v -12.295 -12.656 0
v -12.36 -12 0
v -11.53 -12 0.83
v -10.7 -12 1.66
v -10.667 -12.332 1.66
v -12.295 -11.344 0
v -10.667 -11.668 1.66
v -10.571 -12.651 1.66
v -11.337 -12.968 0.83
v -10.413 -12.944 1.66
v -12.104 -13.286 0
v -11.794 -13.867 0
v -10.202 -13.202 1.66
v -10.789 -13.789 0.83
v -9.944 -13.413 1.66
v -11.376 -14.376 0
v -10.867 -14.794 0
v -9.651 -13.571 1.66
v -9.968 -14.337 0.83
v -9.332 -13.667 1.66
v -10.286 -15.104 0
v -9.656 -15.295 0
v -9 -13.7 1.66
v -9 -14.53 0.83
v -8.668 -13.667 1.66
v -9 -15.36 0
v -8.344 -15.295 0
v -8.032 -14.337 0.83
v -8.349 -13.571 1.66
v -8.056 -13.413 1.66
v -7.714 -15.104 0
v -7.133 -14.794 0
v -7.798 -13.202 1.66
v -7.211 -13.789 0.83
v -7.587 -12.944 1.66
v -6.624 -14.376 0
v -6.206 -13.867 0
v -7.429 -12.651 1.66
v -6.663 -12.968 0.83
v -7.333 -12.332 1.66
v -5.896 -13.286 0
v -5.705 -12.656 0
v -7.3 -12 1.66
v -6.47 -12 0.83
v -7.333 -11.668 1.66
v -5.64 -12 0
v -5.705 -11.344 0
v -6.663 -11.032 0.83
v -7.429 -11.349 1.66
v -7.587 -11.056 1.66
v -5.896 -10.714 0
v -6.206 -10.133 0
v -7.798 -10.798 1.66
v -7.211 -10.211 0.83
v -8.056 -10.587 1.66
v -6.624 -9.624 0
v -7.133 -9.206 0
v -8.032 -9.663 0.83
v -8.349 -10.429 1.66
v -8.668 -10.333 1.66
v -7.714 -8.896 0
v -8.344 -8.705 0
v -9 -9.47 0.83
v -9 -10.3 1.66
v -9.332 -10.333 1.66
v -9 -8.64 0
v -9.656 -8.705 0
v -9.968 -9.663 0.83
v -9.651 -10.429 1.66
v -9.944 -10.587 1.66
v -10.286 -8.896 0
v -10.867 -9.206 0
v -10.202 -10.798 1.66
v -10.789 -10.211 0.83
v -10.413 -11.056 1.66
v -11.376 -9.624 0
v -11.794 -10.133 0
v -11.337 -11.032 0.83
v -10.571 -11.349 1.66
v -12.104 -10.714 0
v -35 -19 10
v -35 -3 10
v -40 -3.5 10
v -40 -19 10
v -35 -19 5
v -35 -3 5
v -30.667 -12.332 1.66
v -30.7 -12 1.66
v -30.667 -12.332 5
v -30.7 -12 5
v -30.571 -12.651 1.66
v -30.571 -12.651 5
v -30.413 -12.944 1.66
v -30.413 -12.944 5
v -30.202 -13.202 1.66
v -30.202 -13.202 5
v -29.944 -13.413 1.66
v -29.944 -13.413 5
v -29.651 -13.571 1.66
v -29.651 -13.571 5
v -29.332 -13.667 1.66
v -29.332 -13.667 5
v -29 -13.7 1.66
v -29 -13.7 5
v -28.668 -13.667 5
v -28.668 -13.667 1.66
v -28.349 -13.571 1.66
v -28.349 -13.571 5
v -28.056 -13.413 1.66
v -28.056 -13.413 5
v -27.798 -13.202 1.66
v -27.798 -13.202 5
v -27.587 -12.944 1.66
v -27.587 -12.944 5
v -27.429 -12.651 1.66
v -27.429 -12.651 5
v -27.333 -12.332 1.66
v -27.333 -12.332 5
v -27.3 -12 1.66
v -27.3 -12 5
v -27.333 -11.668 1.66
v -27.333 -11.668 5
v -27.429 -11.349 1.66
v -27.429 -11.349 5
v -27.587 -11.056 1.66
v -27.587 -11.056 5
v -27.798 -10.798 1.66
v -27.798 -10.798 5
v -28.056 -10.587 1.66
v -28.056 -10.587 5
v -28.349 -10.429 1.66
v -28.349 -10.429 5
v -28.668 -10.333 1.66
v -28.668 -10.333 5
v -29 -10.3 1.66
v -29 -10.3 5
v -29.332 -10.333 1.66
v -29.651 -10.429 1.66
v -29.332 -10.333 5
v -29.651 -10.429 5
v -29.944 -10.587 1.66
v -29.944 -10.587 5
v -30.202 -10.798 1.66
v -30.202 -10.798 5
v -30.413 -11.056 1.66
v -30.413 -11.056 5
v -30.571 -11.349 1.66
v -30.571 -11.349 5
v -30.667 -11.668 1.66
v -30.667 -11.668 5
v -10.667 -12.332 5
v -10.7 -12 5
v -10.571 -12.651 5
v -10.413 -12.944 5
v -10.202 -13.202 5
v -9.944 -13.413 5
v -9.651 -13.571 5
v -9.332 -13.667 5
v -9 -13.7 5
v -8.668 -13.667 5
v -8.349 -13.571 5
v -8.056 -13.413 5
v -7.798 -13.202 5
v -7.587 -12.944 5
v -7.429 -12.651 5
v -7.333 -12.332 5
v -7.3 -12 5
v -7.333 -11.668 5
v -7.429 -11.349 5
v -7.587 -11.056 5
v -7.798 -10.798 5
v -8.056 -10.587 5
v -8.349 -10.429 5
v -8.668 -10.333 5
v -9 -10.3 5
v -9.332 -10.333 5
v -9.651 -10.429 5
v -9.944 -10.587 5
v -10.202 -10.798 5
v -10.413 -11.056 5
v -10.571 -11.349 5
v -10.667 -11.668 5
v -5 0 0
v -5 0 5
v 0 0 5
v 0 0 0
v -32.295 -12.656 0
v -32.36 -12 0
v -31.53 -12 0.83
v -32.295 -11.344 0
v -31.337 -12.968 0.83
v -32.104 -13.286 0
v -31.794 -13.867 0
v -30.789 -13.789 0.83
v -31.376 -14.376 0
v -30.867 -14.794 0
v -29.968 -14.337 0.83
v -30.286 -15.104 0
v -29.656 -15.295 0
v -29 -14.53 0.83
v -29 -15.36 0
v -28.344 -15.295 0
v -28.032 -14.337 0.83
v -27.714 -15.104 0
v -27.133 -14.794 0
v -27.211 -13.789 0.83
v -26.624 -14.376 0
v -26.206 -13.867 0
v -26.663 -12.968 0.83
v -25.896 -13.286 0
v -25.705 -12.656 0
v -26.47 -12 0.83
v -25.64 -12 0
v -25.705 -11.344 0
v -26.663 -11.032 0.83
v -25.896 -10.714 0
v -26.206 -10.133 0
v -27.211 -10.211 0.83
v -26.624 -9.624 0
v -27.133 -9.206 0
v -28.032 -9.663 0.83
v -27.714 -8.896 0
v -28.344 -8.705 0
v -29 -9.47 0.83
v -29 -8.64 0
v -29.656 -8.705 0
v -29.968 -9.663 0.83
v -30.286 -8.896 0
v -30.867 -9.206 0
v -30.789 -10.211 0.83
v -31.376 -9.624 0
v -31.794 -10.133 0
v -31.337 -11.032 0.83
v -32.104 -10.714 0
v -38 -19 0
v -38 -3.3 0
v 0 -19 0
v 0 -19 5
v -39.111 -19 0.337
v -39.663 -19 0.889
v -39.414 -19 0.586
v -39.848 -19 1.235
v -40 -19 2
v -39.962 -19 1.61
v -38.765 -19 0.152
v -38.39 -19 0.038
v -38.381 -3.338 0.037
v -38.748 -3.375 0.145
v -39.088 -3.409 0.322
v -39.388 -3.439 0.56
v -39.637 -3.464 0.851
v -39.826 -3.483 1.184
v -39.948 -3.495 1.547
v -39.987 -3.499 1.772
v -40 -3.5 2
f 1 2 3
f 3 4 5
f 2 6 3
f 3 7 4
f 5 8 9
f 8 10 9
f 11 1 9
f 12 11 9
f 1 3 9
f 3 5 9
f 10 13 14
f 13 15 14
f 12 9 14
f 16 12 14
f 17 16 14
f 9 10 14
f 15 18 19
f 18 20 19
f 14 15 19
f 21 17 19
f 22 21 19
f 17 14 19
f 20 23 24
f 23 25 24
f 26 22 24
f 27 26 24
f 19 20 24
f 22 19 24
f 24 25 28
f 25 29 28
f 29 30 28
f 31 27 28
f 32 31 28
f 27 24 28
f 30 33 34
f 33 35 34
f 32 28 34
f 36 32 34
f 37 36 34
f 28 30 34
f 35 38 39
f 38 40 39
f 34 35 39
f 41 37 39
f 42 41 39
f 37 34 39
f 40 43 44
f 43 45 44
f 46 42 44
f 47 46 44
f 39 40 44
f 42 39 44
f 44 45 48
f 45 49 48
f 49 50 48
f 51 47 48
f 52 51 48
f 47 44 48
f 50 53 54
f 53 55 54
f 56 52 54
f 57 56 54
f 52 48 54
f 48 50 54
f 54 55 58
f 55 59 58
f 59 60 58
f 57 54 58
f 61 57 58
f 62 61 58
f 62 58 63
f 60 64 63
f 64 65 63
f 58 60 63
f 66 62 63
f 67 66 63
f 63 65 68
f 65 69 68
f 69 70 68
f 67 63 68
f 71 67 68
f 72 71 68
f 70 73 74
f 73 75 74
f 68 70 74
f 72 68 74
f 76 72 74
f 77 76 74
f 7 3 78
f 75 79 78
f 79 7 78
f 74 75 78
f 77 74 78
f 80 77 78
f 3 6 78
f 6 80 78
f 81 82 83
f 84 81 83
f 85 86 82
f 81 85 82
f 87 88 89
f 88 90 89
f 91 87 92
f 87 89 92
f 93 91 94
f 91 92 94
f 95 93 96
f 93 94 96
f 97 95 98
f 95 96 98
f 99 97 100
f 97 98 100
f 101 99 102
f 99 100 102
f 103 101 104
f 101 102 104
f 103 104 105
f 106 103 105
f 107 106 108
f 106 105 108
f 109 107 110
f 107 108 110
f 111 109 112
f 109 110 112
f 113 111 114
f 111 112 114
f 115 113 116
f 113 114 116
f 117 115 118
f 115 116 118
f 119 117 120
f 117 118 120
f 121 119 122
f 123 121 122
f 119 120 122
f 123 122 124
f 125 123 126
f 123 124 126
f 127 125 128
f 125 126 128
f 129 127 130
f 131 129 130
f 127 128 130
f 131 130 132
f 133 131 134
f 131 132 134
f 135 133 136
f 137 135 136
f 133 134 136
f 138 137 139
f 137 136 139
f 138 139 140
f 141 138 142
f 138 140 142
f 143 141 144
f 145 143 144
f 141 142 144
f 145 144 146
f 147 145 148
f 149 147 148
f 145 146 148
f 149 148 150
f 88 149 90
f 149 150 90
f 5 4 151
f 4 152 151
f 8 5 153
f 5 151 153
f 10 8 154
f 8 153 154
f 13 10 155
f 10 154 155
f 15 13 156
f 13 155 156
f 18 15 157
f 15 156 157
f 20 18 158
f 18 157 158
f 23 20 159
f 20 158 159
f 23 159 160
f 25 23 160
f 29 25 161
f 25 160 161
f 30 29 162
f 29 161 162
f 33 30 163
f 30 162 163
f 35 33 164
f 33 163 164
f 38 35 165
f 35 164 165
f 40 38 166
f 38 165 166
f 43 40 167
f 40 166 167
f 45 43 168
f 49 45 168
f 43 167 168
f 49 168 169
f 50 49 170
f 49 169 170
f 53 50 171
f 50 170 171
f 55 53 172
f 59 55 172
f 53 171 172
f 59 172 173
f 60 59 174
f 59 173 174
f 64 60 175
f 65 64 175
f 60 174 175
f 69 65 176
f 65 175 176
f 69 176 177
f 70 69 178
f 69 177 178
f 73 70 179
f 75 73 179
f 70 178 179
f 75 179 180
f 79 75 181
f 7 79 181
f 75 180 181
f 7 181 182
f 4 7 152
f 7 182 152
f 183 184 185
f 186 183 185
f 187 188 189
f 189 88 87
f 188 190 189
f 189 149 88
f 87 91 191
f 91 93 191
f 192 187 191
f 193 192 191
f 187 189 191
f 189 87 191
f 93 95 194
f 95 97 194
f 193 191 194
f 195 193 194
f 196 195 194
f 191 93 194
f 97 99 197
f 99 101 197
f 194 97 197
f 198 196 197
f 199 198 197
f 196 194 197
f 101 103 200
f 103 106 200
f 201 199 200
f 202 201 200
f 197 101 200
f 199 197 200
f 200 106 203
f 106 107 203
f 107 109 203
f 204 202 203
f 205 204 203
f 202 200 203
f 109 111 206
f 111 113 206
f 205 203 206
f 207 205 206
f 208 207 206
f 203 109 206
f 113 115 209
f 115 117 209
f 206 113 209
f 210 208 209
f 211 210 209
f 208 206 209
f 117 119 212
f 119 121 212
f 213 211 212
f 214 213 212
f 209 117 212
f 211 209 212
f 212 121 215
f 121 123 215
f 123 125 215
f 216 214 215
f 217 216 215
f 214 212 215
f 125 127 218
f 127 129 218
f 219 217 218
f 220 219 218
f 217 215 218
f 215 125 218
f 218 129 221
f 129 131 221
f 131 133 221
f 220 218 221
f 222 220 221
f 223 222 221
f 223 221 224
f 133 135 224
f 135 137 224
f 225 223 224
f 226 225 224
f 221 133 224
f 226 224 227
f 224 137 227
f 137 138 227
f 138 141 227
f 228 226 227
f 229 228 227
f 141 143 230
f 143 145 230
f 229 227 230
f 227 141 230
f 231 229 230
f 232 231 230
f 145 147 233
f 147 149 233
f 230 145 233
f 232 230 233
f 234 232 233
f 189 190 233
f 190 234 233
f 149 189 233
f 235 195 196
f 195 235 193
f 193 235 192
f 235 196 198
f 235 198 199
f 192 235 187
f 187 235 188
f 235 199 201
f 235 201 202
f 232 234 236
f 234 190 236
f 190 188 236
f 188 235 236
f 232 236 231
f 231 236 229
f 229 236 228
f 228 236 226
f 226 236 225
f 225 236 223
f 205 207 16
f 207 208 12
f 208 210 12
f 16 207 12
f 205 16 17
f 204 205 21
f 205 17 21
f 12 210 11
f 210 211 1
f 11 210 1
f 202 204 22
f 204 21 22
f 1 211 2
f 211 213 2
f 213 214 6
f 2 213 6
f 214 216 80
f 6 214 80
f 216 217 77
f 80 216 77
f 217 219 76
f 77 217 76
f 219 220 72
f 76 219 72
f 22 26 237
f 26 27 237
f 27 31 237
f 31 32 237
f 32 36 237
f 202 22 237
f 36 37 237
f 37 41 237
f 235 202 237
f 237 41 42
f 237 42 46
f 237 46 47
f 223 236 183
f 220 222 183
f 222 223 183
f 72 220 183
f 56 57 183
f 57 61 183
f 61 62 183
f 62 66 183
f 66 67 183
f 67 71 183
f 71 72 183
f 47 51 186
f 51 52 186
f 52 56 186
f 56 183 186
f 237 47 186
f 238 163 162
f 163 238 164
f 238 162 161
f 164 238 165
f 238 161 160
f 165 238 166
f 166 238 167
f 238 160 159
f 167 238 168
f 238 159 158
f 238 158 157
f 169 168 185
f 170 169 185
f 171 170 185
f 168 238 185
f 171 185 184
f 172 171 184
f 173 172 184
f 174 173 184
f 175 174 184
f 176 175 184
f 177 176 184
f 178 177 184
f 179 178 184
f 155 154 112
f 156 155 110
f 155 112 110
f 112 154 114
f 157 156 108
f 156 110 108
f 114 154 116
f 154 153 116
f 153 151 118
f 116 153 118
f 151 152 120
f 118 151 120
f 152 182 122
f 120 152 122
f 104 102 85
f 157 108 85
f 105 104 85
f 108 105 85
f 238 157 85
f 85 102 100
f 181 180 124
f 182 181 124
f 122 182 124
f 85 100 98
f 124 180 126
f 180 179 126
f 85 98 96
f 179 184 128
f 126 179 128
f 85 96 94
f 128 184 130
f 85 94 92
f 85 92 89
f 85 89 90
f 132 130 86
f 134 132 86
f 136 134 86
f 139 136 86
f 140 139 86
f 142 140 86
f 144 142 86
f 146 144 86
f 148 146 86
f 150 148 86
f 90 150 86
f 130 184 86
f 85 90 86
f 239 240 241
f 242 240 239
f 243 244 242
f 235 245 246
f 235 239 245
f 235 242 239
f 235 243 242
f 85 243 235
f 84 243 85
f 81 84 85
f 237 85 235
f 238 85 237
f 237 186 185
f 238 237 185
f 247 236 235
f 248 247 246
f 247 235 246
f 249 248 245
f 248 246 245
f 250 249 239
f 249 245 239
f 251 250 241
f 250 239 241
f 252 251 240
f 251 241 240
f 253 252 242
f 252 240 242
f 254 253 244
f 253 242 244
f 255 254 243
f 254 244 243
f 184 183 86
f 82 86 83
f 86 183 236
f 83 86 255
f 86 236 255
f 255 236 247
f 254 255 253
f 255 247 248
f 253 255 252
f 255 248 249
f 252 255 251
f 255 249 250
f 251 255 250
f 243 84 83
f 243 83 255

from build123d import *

# Parameters (mm, degrees)
F1_DEPTH       = 19
F3_DEPTH       = 25
F4_D           = 3.4
F4_CSINK_D     = 6.72
F4_CSINK_ANGLE = 90
F5_R           = 2


with BuildPart() as f1:
    # F0 (on Front) → F1 (new body)
    with BuildSketch(Plane.XZ):
        Polygon((-40, 0), (0, 0), (0, 5), (-35, 5), (-35, 10), (-40, 10), align=None)
    extrude(amount=F1_DEPTH)

    # F2 (on face) → F3 (cut)
    with BuildSketch(Plane(origin=(0, 0, 0), x_dir=(1, 0, 0), z_dir=(0, 0, -1))):
        Polygon((-5, 0), (-40, 3.5), (-40, 0), align=None)
    extrude(amount=-F3_DEPTH, mode=Mode.SUBTRACT)

    # F4 (through all)
    with Locations(Plane(origin=(0, 0, 0), x_dir=(1, 0, 0), z_dir=(0, 0, -1))):
        with Locations((-9, 12), (-29, 12)):
            CounterSinkHole(F4_D / 2, F4_CSINK_D / 2, counter_sink_angle=F4_CSINK_ANGLE)

    # F5
    f5_edges = [f1.edges().sort_by_distance(p)[0] for p in [
        (-40, -11.25, 0),
    ]]
    fillet(f5_edges, radius=F5_R)


solid = f1.part
